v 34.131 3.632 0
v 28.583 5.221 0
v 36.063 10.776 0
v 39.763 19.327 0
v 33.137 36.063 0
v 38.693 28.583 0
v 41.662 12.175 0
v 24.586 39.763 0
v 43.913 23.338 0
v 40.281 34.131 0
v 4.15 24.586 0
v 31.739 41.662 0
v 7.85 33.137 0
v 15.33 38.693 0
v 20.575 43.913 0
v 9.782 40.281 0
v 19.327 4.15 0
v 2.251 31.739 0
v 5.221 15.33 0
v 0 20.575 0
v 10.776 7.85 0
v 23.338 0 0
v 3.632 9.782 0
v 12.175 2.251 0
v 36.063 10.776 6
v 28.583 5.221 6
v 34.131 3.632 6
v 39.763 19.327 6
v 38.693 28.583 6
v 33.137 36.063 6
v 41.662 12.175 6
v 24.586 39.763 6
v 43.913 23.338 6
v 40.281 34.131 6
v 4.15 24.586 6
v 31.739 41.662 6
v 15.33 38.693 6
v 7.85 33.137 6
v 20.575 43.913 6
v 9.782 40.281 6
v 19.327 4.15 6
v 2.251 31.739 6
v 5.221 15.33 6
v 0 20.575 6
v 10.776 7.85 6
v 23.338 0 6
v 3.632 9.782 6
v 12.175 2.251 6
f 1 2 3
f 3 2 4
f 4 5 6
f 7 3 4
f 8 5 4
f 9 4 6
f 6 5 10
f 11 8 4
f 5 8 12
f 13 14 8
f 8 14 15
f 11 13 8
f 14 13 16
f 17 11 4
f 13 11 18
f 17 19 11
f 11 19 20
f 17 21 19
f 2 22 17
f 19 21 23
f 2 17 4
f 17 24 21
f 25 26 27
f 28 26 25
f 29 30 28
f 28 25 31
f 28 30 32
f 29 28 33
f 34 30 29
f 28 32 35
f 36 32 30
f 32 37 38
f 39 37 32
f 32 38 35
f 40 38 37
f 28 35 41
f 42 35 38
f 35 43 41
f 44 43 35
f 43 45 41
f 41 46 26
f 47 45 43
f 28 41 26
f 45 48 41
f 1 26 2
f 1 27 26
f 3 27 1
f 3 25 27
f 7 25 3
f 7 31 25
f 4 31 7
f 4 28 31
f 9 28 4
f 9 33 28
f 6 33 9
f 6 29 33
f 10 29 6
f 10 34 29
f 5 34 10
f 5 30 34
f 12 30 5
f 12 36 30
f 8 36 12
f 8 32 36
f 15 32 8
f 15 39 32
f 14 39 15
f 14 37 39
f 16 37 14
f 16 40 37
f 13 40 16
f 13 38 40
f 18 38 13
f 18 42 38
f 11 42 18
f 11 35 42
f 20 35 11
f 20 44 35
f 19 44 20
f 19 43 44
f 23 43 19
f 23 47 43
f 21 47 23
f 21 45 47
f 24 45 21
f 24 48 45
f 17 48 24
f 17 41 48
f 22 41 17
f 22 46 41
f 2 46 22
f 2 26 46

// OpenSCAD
$fn = 32;

// ----------------------------------------------------------------------
// Chain sprocket: 12 teeth, 18 mm root radius
// ----------------------------------------------------------------------

// --- parameters (mm) ---
profile_height = 6;       // extrusion height
profile_points = 24;      // points of the closed outline

profile = [[39.763, 19.327], [43.913, 23.338], [38.693, 28.583], [40.281, 34.131], [33.137, 36.063], [31.739, 41.662], [24.586, 39.763], [20.575, 43.913], [15.33, 38.693], [9.782, 40.281], [7.85, 33.137], [2.251, 31.739], [4.15, 24.586], [0, 20.575], [5.221, 15.33], [3.632, 9.782], [10.776, 7.85], [12.175, 2.251], [19.327, 4.15], [23.338, 0], [28.583, 5.221], [34.131, 3.632], [36.063, 10.776], [41.662, 12.175]];  // single closed polygon, 24 points, counter clockwise

// --- the one profile operation ---
linear_extrude(height = profile_height) polygon(points = profile);
